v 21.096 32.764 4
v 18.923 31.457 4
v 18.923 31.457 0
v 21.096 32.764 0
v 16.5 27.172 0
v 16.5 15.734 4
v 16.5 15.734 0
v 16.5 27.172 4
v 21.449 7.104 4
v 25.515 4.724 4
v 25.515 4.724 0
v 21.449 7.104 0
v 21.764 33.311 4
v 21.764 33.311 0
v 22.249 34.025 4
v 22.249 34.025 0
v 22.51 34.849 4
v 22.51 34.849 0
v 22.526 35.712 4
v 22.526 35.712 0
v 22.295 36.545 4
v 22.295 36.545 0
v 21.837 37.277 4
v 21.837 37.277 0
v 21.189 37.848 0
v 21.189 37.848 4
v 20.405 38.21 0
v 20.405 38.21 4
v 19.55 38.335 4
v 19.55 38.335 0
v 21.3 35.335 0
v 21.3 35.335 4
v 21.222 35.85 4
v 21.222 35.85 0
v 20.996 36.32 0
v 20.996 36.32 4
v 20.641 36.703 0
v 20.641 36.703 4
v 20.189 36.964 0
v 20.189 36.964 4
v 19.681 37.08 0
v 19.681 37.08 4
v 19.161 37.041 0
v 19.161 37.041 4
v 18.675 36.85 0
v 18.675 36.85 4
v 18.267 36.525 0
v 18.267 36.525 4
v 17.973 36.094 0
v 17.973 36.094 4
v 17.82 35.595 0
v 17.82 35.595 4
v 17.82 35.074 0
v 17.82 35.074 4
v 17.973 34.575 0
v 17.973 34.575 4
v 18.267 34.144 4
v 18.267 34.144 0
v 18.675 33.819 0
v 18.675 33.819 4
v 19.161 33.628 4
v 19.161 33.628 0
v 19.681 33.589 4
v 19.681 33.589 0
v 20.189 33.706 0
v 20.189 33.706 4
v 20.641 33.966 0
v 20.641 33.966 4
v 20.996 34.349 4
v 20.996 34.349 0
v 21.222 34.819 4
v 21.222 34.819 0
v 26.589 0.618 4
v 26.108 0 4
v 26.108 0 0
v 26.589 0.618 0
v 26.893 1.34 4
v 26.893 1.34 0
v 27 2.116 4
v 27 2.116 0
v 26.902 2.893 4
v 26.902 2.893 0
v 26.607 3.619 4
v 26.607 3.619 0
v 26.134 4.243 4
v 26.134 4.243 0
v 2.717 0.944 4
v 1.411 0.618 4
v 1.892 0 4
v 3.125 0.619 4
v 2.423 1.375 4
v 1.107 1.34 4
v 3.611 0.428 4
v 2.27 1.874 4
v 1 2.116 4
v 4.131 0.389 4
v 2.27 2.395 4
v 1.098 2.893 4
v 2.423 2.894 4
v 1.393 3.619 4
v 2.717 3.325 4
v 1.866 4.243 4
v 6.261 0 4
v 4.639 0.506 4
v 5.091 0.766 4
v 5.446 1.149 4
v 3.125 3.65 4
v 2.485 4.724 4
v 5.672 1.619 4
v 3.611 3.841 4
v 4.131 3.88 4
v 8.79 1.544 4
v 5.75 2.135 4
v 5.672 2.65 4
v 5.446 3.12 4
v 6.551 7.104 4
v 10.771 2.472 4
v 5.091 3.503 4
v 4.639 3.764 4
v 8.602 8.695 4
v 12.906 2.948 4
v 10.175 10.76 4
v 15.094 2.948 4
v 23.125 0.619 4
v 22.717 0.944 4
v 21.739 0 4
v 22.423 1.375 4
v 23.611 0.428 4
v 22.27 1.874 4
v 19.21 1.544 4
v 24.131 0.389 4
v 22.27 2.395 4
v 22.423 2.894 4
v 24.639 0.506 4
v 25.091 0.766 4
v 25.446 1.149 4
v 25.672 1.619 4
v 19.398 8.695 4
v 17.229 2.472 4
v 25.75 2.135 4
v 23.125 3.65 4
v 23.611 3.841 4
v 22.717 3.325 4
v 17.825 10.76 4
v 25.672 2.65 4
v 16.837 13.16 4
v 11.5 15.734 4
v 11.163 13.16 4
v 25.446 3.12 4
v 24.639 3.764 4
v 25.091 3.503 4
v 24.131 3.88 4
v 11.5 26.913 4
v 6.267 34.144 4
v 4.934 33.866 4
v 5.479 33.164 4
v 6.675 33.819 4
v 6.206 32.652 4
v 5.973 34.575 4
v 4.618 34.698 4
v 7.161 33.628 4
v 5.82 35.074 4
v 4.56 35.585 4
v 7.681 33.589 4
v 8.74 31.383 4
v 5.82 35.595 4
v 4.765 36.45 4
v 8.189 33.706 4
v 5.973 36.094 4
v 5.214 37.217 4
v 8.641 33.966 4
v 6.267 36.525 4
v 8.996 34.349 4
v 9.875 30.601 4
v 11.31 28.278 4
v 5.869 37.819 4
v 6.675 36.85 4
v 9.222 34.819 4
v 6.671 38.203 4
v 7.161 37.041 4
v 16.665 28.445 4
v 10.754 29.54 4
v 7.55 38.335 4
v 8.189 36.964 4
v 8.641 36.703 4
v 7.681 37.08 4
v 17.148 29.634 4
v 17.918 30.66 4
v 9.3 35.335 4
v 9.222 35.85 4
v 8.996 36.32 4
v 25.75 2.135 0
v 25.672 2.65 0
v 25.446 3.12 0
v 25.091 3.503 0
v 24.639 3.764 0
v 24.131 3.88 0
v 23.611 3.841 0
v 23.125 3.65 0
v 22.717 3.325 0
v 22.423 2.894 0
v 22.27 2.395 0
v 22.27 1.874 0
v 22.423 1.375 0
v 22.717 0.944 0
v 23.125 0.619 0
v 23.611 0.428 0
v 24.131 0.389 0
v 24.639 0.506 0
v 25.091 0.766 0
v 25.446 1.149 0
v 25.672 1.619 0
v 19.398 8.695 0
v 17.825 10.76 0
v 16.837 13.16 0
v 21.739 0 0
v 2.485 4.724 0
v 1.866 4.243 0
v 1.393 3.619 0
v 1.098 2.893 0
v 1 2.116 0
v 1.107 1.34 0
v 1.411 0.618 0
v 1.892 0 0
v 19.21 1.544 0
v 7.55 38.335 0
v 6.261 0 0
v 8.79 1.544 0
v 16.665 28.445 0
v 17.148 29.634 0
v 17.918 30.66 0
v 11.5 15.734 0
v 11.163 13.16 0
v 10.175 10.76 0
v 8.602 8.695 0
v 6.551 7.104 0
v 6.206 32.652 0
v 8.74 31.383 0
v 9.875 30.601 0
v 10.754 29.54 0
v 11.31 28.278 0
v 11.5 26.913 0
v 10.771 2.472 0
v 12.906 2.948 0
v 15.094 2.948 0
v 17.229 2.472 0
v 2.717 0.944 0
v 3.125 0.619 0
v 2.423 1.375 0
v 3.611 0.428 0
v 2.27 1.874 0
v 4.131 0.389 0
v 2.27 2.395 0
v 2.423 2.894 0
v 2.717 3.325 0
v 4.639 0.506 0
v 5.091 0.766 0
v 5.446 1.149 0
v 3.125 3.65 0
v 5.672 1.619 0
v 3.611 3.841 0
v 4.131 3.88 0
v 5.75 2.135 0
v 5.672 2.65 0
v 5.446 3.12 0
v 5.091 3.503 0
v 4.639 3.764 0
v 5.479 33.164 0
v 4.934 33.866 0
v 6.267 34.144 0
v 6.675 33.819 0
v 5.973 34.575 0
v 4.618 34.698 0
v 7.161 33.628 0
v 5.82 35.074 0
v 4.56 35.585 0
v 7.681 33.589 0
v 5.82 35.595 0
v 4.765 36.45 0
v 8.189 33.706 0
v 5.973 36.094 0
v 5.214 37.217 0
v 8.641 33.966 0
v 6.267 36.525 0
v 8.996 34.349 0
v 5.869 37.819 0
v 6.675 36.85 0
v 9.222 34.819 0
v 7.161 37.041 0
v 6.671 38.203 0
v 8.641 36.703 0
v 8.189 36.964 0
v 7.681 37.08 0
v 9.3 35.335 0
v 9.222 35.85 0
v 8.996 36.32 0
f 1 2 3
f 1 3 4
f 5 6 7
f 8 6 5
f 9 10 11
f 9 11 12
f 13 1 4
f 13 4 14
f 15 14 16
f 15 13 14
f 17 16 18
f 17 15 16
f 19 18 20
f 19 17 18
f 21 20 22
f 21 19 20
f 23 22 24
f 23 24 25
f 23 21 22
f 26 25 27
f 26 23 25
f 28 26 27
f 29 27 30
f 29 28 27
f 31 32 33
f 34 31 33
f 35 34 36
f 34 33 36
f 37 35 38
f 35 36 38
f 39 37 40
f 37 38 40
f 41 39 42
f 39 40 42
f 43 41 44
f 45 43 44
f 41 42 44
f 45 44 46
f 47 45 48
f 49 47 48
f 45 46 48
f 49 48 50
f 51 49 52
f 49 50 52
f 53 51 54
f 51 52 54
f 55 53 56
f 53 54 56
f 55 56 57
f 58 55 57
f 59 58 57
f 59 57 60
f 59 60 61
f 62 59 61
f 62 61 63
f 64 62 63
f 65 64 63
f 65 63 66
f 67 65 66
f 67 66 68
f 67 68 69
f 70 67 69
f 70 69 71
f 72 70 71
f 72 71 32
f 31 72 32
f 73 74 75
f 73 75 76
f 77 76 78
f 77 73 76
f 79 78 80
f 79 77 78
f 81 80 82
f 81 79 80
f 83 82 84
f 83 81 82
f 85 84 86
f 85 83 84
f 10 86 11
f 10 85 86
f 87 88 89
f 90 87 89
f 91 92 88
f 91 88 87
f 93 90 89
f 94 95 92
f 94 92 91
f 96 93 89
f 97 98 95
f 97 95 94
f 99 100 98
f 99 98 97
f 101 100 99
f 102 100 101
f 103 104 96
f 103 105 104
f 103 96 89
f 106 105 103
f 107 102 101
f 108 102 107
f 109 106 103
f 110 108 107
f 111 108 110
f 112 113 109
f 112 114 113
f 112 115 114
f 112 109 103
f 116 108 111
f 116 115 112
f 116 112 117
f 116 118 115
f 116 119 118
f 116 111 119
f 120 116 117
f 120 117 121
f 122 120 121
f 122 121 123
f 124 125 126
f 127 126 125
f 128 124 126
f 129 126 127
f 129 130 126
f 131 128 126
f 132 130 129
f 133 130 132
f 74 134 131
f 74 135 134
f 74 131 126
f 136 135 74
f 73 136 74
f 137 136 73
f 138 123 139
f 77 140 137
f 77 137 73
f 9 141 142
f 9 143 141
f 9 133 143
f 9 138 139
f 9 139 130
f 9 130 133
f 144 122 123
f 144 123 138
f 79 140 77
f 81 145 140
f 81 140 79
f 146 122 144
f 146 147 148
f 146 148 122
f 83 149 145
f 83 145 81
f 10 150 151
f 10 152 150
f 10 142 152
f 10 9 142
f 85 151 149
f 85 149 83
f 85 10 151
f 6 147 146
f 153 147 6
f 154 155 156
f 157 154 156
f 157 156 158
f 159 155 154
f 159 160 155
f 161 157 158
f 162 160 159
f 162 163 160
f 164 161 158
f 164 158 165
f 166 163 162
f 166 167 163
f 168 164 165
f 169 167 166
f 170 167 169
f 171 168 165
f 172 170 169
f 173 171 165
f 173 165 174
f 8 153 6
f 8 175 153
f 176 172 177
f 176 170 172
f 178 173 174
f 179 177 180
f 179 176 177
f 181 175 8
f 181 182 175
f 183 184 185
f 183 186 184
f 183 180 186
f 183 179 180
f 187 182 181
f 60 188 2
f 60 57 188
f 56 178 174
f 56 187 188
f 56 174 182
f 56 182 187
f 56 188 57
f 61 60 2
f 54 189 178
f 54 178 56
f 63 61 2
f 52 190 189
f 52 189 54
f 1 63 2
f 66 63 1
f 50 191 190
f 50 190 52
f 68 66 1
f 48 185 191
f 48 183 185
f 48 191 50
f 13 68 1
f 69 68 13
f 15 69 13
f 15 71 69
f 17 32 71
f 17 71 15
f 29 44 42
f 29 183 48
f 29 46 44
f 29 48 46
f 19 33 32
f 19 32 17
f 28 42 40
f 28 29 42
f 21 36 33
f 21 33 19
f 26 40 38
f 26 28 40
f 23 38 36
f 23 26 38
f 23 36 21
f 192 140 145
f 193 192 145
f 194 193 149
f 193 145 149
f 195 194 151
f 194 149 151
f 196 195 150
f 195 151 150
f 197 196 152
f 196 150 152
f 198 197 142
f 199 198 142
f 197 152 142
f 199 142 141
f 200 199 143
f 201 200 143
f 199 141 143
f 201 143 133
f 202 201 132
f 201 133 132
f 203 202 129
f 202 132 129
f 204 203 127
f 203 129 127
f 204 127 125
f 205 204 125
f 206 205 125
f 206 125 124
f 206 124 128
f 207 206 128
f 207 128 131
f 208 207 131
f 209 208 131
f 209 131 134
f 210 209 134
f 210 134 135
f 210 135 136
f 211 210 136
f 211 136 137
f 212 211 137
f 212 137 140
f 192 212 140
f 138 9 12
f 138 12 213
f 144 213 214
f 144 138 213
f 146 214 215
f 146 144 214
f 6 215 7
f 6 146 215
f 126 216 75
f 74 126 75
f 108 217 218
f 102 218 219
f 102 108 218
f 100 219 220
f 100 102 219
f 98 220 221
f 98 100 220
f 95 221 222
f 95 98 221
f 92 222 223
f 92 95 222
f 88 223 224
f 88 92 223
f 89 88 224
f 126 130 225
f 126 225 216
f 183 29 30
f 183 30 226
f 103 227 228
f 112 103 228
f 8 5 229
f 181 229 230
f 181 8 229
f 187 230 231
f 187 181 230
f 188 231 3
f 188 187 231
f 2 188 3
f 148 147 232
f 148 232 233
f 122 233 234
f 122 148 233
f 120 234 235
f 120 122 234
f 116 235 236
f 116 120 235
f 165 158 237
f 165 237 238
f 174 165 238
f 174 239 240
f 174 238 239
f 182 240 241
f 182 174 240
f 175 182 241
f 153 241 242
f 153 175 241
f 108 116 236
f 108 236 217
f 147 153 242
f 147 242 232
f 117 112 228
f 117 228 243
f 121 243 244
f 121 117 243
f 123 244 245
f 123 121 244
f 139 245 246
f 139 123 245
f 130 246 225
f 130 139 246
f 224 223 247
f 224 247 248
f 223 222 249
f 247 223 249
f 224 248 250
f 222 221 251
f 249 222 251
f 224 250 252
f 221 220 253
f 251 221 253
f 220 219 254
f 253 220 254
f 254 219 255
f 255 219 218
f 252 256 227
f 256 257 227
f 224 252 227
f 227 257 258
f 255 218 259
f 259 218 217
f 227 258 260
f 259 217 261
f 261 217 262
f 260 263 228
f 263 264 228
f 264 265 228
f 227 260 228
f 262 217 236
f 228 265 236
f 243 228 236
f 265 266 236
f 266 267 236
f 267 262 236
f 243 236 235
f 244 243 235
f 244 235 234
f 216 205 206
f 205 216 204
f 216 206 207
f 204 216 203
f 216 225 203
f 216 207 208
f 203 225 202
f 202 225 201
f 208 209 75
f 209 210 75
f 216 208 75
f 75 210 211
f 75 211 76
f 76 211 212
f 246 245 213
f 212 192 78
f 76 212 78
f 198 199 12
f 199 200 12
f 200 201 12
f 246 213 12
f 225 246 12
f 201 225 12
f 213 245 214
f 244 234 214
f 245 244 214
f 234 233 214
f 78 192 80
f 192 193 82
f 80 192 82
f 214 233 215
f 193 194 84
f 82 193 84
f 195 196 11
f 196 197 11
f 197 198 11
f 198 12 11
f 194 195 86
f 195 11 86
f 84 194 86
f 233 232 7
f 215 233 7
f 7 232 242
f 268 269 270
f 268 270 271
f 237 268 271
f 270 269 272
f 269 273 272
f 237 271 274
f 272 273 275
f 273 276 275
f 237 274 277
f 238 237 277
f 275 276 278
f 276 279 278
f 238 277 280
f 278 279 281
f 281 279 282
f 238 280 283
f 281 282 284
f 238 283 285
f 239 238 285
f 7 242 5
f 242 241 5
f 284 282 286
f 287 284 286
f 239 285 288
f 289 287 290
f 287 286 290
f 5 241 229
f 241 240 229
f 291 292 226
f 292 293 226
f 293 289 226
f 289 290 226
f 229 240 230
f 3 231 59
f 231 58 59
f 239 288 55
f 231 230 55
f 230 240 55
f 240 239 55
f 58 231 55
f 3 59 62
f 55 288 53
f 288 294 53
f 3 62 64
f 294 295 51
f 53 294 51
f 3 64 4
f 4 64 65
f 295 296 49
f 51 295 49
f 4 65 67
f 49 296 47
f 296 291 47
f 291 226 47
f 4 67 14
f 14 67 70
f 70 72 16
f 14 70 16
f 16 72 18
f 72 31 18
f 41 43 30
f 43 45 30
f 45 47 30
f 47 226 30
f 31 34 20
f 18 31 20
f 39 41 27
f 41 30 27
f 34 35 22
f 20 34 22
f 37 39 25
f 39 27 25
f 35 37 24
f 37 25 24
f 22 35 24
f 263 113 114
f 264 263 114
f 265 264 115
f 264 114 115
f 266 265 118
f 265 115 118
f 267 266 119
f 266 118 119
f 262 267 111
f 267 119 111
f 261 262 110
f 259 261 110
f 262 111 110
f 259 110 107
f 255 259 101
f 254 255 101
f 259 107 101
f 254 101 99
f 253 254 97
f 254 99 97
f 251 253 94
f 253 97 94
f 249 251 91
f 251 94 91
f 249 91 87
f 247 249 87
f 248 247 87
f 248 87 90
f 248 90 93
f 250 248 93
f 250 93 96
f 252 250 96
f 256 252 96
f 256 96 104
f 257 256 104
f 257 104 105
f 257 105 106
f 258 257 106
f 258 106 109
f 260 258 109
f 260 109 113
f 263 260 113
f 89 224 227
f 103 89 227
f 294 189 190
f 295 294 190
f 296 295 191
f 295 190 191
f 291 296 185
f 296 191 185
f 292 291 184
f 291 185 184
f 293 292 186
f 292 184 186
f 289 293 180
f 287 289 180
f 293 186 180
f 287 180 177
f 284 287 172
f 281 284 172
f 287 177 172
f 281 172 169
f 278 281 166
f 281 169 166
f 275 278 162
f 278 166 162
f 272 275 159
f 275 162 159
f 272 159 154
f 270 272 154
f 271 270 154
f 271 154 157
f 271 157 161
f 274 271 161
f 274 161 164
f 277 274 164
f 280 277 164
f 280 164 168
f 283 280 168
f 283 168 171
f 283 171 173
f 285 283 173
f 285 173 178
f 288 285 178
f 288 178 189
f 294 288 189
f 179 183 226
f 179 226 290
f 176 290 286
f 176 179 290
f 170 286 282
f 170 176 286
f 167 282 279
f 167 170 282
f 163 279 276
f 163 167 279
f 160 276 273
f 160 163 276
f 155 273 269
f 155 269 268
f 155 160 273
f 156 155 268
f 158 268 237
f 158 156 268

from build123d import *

# Parameters (mm, degrees)
SKETCH_1_W          = 28
SKETCH_1_H          = 40
EXTRUDE_1_DEPTH     = 4
SKETCH_2_R          = 1.75
CUT_EXTRUDE_1_DEPTH = 49.989794856
SKETCH_3_W          = 46.756275812
SKETCH_3_H          = 48.920918211
CUT_EXTRUDE_2_DEPTH = 49.989794856


with BuildPart() as part:
    # 草图1 → 凸台-拉伸1 (new body)
    with BuildSketch(Plane.XY):
        with Locations((14, 20)):
            Rectangle(SKETCH_1_W, SKETCH_1_H)
    extrude(amount=EXTRUDE_1_DEPTH)

    # 草图2 → 切除-拉伸1 (cut, through all)
    with BuildSketch(Plane.XY.offset(4)):
        with Locations((7.55, 35.334562065)):
            Circle(SKETCH_2_R)
        with Locations((19.55, 35.334562065)):
            Circle(SKETCH_2_R)
        with Locations((4, 2.134562065)):
            Circle(SKETCH_2_R)
        with Locations((24, 2.134562065)):
            Circle(SKETCH_2_R)
    extrude(amount=-CUT_EXTRUDE_1_DEPTH, mode=Mode.SUBTRACT)

    # 草图3 → 切除-拉伸2 (cut, through all)
    with BuildSketch(Plane.XY.offset(4)):
        with Locations((16.027589169, 19.550398151)):
            Rectangle(SKETCH_3_W, SKETCH_3_H)
        with BuildLine():
            Line((11.5, 26.912679478), (11.5, 15.734177946))
            ThreePointArc((11.5, 15.734177946), (10.174988112, 10.759785395), (6.551083749, 7.103618696))
            Line((6.551083749, 7.103618696), (2.484674875, 4.72372984))
            ThreePointArc((2.484674875, 4.72372984), (1.424970874, 0.595333362), (5.563000373, -0.426107736))
            Line((5.563000373, -0.426107736), (8.789998756, 1.543611152))
            ThreePointArc((8.789998756, 1.543611152), (14, 3.008045147), (19.210001244, 1.543611152))
            Line((19.210001244, 1.543611152), (22.436999627, -0.426107736))
            ThreePointArc((22.436999627, -0.426107736), (26.575029126, 0.595333362), (25.515325125, 4.72372984))
            Line((25.515325125, 4.72372984), (21.448916251, 7.103618696))
            ThreePointArc((21.448916251, 7.103618696), (17.825011888, 10.759785395), (16.5, 15.734177946))
            Line((16.5, 15.734177946), (16.5, 27.172210605))
            ThreePointArc((16.5, 27.172210605), (17.147820732, 29.633619881), (18.923414249, 31.457208372))
            Line((18.923414249, 31.457208372), (21.095951451, 32.763563405))
            ThreePointArc((21.095951451, 32.763563405), (22.440760798, 36.136747835), (19.55, 38.334562065))
            Line((19.55, 38.334562065), (7.55, 38.334562065))
            ThreePointArc((7.55, 38.334562065), (4.630537584, 36.025025097), (6.206146085, 32.652388198))
            Line((6.206146085, 32.652388198), (8.739756525, 31.382969257))
            ThreePointArc((8.739756525, 31.382969257), (10.754337941, 29.539580444), (11.5, 26.912679478))
        make_face(mode=Mode.SUBTRACT)
    extrude(amount=-CUT_EXTRUDE_2_DEPTH, mode=Mode.SUBTRACT)


solid = part.part
